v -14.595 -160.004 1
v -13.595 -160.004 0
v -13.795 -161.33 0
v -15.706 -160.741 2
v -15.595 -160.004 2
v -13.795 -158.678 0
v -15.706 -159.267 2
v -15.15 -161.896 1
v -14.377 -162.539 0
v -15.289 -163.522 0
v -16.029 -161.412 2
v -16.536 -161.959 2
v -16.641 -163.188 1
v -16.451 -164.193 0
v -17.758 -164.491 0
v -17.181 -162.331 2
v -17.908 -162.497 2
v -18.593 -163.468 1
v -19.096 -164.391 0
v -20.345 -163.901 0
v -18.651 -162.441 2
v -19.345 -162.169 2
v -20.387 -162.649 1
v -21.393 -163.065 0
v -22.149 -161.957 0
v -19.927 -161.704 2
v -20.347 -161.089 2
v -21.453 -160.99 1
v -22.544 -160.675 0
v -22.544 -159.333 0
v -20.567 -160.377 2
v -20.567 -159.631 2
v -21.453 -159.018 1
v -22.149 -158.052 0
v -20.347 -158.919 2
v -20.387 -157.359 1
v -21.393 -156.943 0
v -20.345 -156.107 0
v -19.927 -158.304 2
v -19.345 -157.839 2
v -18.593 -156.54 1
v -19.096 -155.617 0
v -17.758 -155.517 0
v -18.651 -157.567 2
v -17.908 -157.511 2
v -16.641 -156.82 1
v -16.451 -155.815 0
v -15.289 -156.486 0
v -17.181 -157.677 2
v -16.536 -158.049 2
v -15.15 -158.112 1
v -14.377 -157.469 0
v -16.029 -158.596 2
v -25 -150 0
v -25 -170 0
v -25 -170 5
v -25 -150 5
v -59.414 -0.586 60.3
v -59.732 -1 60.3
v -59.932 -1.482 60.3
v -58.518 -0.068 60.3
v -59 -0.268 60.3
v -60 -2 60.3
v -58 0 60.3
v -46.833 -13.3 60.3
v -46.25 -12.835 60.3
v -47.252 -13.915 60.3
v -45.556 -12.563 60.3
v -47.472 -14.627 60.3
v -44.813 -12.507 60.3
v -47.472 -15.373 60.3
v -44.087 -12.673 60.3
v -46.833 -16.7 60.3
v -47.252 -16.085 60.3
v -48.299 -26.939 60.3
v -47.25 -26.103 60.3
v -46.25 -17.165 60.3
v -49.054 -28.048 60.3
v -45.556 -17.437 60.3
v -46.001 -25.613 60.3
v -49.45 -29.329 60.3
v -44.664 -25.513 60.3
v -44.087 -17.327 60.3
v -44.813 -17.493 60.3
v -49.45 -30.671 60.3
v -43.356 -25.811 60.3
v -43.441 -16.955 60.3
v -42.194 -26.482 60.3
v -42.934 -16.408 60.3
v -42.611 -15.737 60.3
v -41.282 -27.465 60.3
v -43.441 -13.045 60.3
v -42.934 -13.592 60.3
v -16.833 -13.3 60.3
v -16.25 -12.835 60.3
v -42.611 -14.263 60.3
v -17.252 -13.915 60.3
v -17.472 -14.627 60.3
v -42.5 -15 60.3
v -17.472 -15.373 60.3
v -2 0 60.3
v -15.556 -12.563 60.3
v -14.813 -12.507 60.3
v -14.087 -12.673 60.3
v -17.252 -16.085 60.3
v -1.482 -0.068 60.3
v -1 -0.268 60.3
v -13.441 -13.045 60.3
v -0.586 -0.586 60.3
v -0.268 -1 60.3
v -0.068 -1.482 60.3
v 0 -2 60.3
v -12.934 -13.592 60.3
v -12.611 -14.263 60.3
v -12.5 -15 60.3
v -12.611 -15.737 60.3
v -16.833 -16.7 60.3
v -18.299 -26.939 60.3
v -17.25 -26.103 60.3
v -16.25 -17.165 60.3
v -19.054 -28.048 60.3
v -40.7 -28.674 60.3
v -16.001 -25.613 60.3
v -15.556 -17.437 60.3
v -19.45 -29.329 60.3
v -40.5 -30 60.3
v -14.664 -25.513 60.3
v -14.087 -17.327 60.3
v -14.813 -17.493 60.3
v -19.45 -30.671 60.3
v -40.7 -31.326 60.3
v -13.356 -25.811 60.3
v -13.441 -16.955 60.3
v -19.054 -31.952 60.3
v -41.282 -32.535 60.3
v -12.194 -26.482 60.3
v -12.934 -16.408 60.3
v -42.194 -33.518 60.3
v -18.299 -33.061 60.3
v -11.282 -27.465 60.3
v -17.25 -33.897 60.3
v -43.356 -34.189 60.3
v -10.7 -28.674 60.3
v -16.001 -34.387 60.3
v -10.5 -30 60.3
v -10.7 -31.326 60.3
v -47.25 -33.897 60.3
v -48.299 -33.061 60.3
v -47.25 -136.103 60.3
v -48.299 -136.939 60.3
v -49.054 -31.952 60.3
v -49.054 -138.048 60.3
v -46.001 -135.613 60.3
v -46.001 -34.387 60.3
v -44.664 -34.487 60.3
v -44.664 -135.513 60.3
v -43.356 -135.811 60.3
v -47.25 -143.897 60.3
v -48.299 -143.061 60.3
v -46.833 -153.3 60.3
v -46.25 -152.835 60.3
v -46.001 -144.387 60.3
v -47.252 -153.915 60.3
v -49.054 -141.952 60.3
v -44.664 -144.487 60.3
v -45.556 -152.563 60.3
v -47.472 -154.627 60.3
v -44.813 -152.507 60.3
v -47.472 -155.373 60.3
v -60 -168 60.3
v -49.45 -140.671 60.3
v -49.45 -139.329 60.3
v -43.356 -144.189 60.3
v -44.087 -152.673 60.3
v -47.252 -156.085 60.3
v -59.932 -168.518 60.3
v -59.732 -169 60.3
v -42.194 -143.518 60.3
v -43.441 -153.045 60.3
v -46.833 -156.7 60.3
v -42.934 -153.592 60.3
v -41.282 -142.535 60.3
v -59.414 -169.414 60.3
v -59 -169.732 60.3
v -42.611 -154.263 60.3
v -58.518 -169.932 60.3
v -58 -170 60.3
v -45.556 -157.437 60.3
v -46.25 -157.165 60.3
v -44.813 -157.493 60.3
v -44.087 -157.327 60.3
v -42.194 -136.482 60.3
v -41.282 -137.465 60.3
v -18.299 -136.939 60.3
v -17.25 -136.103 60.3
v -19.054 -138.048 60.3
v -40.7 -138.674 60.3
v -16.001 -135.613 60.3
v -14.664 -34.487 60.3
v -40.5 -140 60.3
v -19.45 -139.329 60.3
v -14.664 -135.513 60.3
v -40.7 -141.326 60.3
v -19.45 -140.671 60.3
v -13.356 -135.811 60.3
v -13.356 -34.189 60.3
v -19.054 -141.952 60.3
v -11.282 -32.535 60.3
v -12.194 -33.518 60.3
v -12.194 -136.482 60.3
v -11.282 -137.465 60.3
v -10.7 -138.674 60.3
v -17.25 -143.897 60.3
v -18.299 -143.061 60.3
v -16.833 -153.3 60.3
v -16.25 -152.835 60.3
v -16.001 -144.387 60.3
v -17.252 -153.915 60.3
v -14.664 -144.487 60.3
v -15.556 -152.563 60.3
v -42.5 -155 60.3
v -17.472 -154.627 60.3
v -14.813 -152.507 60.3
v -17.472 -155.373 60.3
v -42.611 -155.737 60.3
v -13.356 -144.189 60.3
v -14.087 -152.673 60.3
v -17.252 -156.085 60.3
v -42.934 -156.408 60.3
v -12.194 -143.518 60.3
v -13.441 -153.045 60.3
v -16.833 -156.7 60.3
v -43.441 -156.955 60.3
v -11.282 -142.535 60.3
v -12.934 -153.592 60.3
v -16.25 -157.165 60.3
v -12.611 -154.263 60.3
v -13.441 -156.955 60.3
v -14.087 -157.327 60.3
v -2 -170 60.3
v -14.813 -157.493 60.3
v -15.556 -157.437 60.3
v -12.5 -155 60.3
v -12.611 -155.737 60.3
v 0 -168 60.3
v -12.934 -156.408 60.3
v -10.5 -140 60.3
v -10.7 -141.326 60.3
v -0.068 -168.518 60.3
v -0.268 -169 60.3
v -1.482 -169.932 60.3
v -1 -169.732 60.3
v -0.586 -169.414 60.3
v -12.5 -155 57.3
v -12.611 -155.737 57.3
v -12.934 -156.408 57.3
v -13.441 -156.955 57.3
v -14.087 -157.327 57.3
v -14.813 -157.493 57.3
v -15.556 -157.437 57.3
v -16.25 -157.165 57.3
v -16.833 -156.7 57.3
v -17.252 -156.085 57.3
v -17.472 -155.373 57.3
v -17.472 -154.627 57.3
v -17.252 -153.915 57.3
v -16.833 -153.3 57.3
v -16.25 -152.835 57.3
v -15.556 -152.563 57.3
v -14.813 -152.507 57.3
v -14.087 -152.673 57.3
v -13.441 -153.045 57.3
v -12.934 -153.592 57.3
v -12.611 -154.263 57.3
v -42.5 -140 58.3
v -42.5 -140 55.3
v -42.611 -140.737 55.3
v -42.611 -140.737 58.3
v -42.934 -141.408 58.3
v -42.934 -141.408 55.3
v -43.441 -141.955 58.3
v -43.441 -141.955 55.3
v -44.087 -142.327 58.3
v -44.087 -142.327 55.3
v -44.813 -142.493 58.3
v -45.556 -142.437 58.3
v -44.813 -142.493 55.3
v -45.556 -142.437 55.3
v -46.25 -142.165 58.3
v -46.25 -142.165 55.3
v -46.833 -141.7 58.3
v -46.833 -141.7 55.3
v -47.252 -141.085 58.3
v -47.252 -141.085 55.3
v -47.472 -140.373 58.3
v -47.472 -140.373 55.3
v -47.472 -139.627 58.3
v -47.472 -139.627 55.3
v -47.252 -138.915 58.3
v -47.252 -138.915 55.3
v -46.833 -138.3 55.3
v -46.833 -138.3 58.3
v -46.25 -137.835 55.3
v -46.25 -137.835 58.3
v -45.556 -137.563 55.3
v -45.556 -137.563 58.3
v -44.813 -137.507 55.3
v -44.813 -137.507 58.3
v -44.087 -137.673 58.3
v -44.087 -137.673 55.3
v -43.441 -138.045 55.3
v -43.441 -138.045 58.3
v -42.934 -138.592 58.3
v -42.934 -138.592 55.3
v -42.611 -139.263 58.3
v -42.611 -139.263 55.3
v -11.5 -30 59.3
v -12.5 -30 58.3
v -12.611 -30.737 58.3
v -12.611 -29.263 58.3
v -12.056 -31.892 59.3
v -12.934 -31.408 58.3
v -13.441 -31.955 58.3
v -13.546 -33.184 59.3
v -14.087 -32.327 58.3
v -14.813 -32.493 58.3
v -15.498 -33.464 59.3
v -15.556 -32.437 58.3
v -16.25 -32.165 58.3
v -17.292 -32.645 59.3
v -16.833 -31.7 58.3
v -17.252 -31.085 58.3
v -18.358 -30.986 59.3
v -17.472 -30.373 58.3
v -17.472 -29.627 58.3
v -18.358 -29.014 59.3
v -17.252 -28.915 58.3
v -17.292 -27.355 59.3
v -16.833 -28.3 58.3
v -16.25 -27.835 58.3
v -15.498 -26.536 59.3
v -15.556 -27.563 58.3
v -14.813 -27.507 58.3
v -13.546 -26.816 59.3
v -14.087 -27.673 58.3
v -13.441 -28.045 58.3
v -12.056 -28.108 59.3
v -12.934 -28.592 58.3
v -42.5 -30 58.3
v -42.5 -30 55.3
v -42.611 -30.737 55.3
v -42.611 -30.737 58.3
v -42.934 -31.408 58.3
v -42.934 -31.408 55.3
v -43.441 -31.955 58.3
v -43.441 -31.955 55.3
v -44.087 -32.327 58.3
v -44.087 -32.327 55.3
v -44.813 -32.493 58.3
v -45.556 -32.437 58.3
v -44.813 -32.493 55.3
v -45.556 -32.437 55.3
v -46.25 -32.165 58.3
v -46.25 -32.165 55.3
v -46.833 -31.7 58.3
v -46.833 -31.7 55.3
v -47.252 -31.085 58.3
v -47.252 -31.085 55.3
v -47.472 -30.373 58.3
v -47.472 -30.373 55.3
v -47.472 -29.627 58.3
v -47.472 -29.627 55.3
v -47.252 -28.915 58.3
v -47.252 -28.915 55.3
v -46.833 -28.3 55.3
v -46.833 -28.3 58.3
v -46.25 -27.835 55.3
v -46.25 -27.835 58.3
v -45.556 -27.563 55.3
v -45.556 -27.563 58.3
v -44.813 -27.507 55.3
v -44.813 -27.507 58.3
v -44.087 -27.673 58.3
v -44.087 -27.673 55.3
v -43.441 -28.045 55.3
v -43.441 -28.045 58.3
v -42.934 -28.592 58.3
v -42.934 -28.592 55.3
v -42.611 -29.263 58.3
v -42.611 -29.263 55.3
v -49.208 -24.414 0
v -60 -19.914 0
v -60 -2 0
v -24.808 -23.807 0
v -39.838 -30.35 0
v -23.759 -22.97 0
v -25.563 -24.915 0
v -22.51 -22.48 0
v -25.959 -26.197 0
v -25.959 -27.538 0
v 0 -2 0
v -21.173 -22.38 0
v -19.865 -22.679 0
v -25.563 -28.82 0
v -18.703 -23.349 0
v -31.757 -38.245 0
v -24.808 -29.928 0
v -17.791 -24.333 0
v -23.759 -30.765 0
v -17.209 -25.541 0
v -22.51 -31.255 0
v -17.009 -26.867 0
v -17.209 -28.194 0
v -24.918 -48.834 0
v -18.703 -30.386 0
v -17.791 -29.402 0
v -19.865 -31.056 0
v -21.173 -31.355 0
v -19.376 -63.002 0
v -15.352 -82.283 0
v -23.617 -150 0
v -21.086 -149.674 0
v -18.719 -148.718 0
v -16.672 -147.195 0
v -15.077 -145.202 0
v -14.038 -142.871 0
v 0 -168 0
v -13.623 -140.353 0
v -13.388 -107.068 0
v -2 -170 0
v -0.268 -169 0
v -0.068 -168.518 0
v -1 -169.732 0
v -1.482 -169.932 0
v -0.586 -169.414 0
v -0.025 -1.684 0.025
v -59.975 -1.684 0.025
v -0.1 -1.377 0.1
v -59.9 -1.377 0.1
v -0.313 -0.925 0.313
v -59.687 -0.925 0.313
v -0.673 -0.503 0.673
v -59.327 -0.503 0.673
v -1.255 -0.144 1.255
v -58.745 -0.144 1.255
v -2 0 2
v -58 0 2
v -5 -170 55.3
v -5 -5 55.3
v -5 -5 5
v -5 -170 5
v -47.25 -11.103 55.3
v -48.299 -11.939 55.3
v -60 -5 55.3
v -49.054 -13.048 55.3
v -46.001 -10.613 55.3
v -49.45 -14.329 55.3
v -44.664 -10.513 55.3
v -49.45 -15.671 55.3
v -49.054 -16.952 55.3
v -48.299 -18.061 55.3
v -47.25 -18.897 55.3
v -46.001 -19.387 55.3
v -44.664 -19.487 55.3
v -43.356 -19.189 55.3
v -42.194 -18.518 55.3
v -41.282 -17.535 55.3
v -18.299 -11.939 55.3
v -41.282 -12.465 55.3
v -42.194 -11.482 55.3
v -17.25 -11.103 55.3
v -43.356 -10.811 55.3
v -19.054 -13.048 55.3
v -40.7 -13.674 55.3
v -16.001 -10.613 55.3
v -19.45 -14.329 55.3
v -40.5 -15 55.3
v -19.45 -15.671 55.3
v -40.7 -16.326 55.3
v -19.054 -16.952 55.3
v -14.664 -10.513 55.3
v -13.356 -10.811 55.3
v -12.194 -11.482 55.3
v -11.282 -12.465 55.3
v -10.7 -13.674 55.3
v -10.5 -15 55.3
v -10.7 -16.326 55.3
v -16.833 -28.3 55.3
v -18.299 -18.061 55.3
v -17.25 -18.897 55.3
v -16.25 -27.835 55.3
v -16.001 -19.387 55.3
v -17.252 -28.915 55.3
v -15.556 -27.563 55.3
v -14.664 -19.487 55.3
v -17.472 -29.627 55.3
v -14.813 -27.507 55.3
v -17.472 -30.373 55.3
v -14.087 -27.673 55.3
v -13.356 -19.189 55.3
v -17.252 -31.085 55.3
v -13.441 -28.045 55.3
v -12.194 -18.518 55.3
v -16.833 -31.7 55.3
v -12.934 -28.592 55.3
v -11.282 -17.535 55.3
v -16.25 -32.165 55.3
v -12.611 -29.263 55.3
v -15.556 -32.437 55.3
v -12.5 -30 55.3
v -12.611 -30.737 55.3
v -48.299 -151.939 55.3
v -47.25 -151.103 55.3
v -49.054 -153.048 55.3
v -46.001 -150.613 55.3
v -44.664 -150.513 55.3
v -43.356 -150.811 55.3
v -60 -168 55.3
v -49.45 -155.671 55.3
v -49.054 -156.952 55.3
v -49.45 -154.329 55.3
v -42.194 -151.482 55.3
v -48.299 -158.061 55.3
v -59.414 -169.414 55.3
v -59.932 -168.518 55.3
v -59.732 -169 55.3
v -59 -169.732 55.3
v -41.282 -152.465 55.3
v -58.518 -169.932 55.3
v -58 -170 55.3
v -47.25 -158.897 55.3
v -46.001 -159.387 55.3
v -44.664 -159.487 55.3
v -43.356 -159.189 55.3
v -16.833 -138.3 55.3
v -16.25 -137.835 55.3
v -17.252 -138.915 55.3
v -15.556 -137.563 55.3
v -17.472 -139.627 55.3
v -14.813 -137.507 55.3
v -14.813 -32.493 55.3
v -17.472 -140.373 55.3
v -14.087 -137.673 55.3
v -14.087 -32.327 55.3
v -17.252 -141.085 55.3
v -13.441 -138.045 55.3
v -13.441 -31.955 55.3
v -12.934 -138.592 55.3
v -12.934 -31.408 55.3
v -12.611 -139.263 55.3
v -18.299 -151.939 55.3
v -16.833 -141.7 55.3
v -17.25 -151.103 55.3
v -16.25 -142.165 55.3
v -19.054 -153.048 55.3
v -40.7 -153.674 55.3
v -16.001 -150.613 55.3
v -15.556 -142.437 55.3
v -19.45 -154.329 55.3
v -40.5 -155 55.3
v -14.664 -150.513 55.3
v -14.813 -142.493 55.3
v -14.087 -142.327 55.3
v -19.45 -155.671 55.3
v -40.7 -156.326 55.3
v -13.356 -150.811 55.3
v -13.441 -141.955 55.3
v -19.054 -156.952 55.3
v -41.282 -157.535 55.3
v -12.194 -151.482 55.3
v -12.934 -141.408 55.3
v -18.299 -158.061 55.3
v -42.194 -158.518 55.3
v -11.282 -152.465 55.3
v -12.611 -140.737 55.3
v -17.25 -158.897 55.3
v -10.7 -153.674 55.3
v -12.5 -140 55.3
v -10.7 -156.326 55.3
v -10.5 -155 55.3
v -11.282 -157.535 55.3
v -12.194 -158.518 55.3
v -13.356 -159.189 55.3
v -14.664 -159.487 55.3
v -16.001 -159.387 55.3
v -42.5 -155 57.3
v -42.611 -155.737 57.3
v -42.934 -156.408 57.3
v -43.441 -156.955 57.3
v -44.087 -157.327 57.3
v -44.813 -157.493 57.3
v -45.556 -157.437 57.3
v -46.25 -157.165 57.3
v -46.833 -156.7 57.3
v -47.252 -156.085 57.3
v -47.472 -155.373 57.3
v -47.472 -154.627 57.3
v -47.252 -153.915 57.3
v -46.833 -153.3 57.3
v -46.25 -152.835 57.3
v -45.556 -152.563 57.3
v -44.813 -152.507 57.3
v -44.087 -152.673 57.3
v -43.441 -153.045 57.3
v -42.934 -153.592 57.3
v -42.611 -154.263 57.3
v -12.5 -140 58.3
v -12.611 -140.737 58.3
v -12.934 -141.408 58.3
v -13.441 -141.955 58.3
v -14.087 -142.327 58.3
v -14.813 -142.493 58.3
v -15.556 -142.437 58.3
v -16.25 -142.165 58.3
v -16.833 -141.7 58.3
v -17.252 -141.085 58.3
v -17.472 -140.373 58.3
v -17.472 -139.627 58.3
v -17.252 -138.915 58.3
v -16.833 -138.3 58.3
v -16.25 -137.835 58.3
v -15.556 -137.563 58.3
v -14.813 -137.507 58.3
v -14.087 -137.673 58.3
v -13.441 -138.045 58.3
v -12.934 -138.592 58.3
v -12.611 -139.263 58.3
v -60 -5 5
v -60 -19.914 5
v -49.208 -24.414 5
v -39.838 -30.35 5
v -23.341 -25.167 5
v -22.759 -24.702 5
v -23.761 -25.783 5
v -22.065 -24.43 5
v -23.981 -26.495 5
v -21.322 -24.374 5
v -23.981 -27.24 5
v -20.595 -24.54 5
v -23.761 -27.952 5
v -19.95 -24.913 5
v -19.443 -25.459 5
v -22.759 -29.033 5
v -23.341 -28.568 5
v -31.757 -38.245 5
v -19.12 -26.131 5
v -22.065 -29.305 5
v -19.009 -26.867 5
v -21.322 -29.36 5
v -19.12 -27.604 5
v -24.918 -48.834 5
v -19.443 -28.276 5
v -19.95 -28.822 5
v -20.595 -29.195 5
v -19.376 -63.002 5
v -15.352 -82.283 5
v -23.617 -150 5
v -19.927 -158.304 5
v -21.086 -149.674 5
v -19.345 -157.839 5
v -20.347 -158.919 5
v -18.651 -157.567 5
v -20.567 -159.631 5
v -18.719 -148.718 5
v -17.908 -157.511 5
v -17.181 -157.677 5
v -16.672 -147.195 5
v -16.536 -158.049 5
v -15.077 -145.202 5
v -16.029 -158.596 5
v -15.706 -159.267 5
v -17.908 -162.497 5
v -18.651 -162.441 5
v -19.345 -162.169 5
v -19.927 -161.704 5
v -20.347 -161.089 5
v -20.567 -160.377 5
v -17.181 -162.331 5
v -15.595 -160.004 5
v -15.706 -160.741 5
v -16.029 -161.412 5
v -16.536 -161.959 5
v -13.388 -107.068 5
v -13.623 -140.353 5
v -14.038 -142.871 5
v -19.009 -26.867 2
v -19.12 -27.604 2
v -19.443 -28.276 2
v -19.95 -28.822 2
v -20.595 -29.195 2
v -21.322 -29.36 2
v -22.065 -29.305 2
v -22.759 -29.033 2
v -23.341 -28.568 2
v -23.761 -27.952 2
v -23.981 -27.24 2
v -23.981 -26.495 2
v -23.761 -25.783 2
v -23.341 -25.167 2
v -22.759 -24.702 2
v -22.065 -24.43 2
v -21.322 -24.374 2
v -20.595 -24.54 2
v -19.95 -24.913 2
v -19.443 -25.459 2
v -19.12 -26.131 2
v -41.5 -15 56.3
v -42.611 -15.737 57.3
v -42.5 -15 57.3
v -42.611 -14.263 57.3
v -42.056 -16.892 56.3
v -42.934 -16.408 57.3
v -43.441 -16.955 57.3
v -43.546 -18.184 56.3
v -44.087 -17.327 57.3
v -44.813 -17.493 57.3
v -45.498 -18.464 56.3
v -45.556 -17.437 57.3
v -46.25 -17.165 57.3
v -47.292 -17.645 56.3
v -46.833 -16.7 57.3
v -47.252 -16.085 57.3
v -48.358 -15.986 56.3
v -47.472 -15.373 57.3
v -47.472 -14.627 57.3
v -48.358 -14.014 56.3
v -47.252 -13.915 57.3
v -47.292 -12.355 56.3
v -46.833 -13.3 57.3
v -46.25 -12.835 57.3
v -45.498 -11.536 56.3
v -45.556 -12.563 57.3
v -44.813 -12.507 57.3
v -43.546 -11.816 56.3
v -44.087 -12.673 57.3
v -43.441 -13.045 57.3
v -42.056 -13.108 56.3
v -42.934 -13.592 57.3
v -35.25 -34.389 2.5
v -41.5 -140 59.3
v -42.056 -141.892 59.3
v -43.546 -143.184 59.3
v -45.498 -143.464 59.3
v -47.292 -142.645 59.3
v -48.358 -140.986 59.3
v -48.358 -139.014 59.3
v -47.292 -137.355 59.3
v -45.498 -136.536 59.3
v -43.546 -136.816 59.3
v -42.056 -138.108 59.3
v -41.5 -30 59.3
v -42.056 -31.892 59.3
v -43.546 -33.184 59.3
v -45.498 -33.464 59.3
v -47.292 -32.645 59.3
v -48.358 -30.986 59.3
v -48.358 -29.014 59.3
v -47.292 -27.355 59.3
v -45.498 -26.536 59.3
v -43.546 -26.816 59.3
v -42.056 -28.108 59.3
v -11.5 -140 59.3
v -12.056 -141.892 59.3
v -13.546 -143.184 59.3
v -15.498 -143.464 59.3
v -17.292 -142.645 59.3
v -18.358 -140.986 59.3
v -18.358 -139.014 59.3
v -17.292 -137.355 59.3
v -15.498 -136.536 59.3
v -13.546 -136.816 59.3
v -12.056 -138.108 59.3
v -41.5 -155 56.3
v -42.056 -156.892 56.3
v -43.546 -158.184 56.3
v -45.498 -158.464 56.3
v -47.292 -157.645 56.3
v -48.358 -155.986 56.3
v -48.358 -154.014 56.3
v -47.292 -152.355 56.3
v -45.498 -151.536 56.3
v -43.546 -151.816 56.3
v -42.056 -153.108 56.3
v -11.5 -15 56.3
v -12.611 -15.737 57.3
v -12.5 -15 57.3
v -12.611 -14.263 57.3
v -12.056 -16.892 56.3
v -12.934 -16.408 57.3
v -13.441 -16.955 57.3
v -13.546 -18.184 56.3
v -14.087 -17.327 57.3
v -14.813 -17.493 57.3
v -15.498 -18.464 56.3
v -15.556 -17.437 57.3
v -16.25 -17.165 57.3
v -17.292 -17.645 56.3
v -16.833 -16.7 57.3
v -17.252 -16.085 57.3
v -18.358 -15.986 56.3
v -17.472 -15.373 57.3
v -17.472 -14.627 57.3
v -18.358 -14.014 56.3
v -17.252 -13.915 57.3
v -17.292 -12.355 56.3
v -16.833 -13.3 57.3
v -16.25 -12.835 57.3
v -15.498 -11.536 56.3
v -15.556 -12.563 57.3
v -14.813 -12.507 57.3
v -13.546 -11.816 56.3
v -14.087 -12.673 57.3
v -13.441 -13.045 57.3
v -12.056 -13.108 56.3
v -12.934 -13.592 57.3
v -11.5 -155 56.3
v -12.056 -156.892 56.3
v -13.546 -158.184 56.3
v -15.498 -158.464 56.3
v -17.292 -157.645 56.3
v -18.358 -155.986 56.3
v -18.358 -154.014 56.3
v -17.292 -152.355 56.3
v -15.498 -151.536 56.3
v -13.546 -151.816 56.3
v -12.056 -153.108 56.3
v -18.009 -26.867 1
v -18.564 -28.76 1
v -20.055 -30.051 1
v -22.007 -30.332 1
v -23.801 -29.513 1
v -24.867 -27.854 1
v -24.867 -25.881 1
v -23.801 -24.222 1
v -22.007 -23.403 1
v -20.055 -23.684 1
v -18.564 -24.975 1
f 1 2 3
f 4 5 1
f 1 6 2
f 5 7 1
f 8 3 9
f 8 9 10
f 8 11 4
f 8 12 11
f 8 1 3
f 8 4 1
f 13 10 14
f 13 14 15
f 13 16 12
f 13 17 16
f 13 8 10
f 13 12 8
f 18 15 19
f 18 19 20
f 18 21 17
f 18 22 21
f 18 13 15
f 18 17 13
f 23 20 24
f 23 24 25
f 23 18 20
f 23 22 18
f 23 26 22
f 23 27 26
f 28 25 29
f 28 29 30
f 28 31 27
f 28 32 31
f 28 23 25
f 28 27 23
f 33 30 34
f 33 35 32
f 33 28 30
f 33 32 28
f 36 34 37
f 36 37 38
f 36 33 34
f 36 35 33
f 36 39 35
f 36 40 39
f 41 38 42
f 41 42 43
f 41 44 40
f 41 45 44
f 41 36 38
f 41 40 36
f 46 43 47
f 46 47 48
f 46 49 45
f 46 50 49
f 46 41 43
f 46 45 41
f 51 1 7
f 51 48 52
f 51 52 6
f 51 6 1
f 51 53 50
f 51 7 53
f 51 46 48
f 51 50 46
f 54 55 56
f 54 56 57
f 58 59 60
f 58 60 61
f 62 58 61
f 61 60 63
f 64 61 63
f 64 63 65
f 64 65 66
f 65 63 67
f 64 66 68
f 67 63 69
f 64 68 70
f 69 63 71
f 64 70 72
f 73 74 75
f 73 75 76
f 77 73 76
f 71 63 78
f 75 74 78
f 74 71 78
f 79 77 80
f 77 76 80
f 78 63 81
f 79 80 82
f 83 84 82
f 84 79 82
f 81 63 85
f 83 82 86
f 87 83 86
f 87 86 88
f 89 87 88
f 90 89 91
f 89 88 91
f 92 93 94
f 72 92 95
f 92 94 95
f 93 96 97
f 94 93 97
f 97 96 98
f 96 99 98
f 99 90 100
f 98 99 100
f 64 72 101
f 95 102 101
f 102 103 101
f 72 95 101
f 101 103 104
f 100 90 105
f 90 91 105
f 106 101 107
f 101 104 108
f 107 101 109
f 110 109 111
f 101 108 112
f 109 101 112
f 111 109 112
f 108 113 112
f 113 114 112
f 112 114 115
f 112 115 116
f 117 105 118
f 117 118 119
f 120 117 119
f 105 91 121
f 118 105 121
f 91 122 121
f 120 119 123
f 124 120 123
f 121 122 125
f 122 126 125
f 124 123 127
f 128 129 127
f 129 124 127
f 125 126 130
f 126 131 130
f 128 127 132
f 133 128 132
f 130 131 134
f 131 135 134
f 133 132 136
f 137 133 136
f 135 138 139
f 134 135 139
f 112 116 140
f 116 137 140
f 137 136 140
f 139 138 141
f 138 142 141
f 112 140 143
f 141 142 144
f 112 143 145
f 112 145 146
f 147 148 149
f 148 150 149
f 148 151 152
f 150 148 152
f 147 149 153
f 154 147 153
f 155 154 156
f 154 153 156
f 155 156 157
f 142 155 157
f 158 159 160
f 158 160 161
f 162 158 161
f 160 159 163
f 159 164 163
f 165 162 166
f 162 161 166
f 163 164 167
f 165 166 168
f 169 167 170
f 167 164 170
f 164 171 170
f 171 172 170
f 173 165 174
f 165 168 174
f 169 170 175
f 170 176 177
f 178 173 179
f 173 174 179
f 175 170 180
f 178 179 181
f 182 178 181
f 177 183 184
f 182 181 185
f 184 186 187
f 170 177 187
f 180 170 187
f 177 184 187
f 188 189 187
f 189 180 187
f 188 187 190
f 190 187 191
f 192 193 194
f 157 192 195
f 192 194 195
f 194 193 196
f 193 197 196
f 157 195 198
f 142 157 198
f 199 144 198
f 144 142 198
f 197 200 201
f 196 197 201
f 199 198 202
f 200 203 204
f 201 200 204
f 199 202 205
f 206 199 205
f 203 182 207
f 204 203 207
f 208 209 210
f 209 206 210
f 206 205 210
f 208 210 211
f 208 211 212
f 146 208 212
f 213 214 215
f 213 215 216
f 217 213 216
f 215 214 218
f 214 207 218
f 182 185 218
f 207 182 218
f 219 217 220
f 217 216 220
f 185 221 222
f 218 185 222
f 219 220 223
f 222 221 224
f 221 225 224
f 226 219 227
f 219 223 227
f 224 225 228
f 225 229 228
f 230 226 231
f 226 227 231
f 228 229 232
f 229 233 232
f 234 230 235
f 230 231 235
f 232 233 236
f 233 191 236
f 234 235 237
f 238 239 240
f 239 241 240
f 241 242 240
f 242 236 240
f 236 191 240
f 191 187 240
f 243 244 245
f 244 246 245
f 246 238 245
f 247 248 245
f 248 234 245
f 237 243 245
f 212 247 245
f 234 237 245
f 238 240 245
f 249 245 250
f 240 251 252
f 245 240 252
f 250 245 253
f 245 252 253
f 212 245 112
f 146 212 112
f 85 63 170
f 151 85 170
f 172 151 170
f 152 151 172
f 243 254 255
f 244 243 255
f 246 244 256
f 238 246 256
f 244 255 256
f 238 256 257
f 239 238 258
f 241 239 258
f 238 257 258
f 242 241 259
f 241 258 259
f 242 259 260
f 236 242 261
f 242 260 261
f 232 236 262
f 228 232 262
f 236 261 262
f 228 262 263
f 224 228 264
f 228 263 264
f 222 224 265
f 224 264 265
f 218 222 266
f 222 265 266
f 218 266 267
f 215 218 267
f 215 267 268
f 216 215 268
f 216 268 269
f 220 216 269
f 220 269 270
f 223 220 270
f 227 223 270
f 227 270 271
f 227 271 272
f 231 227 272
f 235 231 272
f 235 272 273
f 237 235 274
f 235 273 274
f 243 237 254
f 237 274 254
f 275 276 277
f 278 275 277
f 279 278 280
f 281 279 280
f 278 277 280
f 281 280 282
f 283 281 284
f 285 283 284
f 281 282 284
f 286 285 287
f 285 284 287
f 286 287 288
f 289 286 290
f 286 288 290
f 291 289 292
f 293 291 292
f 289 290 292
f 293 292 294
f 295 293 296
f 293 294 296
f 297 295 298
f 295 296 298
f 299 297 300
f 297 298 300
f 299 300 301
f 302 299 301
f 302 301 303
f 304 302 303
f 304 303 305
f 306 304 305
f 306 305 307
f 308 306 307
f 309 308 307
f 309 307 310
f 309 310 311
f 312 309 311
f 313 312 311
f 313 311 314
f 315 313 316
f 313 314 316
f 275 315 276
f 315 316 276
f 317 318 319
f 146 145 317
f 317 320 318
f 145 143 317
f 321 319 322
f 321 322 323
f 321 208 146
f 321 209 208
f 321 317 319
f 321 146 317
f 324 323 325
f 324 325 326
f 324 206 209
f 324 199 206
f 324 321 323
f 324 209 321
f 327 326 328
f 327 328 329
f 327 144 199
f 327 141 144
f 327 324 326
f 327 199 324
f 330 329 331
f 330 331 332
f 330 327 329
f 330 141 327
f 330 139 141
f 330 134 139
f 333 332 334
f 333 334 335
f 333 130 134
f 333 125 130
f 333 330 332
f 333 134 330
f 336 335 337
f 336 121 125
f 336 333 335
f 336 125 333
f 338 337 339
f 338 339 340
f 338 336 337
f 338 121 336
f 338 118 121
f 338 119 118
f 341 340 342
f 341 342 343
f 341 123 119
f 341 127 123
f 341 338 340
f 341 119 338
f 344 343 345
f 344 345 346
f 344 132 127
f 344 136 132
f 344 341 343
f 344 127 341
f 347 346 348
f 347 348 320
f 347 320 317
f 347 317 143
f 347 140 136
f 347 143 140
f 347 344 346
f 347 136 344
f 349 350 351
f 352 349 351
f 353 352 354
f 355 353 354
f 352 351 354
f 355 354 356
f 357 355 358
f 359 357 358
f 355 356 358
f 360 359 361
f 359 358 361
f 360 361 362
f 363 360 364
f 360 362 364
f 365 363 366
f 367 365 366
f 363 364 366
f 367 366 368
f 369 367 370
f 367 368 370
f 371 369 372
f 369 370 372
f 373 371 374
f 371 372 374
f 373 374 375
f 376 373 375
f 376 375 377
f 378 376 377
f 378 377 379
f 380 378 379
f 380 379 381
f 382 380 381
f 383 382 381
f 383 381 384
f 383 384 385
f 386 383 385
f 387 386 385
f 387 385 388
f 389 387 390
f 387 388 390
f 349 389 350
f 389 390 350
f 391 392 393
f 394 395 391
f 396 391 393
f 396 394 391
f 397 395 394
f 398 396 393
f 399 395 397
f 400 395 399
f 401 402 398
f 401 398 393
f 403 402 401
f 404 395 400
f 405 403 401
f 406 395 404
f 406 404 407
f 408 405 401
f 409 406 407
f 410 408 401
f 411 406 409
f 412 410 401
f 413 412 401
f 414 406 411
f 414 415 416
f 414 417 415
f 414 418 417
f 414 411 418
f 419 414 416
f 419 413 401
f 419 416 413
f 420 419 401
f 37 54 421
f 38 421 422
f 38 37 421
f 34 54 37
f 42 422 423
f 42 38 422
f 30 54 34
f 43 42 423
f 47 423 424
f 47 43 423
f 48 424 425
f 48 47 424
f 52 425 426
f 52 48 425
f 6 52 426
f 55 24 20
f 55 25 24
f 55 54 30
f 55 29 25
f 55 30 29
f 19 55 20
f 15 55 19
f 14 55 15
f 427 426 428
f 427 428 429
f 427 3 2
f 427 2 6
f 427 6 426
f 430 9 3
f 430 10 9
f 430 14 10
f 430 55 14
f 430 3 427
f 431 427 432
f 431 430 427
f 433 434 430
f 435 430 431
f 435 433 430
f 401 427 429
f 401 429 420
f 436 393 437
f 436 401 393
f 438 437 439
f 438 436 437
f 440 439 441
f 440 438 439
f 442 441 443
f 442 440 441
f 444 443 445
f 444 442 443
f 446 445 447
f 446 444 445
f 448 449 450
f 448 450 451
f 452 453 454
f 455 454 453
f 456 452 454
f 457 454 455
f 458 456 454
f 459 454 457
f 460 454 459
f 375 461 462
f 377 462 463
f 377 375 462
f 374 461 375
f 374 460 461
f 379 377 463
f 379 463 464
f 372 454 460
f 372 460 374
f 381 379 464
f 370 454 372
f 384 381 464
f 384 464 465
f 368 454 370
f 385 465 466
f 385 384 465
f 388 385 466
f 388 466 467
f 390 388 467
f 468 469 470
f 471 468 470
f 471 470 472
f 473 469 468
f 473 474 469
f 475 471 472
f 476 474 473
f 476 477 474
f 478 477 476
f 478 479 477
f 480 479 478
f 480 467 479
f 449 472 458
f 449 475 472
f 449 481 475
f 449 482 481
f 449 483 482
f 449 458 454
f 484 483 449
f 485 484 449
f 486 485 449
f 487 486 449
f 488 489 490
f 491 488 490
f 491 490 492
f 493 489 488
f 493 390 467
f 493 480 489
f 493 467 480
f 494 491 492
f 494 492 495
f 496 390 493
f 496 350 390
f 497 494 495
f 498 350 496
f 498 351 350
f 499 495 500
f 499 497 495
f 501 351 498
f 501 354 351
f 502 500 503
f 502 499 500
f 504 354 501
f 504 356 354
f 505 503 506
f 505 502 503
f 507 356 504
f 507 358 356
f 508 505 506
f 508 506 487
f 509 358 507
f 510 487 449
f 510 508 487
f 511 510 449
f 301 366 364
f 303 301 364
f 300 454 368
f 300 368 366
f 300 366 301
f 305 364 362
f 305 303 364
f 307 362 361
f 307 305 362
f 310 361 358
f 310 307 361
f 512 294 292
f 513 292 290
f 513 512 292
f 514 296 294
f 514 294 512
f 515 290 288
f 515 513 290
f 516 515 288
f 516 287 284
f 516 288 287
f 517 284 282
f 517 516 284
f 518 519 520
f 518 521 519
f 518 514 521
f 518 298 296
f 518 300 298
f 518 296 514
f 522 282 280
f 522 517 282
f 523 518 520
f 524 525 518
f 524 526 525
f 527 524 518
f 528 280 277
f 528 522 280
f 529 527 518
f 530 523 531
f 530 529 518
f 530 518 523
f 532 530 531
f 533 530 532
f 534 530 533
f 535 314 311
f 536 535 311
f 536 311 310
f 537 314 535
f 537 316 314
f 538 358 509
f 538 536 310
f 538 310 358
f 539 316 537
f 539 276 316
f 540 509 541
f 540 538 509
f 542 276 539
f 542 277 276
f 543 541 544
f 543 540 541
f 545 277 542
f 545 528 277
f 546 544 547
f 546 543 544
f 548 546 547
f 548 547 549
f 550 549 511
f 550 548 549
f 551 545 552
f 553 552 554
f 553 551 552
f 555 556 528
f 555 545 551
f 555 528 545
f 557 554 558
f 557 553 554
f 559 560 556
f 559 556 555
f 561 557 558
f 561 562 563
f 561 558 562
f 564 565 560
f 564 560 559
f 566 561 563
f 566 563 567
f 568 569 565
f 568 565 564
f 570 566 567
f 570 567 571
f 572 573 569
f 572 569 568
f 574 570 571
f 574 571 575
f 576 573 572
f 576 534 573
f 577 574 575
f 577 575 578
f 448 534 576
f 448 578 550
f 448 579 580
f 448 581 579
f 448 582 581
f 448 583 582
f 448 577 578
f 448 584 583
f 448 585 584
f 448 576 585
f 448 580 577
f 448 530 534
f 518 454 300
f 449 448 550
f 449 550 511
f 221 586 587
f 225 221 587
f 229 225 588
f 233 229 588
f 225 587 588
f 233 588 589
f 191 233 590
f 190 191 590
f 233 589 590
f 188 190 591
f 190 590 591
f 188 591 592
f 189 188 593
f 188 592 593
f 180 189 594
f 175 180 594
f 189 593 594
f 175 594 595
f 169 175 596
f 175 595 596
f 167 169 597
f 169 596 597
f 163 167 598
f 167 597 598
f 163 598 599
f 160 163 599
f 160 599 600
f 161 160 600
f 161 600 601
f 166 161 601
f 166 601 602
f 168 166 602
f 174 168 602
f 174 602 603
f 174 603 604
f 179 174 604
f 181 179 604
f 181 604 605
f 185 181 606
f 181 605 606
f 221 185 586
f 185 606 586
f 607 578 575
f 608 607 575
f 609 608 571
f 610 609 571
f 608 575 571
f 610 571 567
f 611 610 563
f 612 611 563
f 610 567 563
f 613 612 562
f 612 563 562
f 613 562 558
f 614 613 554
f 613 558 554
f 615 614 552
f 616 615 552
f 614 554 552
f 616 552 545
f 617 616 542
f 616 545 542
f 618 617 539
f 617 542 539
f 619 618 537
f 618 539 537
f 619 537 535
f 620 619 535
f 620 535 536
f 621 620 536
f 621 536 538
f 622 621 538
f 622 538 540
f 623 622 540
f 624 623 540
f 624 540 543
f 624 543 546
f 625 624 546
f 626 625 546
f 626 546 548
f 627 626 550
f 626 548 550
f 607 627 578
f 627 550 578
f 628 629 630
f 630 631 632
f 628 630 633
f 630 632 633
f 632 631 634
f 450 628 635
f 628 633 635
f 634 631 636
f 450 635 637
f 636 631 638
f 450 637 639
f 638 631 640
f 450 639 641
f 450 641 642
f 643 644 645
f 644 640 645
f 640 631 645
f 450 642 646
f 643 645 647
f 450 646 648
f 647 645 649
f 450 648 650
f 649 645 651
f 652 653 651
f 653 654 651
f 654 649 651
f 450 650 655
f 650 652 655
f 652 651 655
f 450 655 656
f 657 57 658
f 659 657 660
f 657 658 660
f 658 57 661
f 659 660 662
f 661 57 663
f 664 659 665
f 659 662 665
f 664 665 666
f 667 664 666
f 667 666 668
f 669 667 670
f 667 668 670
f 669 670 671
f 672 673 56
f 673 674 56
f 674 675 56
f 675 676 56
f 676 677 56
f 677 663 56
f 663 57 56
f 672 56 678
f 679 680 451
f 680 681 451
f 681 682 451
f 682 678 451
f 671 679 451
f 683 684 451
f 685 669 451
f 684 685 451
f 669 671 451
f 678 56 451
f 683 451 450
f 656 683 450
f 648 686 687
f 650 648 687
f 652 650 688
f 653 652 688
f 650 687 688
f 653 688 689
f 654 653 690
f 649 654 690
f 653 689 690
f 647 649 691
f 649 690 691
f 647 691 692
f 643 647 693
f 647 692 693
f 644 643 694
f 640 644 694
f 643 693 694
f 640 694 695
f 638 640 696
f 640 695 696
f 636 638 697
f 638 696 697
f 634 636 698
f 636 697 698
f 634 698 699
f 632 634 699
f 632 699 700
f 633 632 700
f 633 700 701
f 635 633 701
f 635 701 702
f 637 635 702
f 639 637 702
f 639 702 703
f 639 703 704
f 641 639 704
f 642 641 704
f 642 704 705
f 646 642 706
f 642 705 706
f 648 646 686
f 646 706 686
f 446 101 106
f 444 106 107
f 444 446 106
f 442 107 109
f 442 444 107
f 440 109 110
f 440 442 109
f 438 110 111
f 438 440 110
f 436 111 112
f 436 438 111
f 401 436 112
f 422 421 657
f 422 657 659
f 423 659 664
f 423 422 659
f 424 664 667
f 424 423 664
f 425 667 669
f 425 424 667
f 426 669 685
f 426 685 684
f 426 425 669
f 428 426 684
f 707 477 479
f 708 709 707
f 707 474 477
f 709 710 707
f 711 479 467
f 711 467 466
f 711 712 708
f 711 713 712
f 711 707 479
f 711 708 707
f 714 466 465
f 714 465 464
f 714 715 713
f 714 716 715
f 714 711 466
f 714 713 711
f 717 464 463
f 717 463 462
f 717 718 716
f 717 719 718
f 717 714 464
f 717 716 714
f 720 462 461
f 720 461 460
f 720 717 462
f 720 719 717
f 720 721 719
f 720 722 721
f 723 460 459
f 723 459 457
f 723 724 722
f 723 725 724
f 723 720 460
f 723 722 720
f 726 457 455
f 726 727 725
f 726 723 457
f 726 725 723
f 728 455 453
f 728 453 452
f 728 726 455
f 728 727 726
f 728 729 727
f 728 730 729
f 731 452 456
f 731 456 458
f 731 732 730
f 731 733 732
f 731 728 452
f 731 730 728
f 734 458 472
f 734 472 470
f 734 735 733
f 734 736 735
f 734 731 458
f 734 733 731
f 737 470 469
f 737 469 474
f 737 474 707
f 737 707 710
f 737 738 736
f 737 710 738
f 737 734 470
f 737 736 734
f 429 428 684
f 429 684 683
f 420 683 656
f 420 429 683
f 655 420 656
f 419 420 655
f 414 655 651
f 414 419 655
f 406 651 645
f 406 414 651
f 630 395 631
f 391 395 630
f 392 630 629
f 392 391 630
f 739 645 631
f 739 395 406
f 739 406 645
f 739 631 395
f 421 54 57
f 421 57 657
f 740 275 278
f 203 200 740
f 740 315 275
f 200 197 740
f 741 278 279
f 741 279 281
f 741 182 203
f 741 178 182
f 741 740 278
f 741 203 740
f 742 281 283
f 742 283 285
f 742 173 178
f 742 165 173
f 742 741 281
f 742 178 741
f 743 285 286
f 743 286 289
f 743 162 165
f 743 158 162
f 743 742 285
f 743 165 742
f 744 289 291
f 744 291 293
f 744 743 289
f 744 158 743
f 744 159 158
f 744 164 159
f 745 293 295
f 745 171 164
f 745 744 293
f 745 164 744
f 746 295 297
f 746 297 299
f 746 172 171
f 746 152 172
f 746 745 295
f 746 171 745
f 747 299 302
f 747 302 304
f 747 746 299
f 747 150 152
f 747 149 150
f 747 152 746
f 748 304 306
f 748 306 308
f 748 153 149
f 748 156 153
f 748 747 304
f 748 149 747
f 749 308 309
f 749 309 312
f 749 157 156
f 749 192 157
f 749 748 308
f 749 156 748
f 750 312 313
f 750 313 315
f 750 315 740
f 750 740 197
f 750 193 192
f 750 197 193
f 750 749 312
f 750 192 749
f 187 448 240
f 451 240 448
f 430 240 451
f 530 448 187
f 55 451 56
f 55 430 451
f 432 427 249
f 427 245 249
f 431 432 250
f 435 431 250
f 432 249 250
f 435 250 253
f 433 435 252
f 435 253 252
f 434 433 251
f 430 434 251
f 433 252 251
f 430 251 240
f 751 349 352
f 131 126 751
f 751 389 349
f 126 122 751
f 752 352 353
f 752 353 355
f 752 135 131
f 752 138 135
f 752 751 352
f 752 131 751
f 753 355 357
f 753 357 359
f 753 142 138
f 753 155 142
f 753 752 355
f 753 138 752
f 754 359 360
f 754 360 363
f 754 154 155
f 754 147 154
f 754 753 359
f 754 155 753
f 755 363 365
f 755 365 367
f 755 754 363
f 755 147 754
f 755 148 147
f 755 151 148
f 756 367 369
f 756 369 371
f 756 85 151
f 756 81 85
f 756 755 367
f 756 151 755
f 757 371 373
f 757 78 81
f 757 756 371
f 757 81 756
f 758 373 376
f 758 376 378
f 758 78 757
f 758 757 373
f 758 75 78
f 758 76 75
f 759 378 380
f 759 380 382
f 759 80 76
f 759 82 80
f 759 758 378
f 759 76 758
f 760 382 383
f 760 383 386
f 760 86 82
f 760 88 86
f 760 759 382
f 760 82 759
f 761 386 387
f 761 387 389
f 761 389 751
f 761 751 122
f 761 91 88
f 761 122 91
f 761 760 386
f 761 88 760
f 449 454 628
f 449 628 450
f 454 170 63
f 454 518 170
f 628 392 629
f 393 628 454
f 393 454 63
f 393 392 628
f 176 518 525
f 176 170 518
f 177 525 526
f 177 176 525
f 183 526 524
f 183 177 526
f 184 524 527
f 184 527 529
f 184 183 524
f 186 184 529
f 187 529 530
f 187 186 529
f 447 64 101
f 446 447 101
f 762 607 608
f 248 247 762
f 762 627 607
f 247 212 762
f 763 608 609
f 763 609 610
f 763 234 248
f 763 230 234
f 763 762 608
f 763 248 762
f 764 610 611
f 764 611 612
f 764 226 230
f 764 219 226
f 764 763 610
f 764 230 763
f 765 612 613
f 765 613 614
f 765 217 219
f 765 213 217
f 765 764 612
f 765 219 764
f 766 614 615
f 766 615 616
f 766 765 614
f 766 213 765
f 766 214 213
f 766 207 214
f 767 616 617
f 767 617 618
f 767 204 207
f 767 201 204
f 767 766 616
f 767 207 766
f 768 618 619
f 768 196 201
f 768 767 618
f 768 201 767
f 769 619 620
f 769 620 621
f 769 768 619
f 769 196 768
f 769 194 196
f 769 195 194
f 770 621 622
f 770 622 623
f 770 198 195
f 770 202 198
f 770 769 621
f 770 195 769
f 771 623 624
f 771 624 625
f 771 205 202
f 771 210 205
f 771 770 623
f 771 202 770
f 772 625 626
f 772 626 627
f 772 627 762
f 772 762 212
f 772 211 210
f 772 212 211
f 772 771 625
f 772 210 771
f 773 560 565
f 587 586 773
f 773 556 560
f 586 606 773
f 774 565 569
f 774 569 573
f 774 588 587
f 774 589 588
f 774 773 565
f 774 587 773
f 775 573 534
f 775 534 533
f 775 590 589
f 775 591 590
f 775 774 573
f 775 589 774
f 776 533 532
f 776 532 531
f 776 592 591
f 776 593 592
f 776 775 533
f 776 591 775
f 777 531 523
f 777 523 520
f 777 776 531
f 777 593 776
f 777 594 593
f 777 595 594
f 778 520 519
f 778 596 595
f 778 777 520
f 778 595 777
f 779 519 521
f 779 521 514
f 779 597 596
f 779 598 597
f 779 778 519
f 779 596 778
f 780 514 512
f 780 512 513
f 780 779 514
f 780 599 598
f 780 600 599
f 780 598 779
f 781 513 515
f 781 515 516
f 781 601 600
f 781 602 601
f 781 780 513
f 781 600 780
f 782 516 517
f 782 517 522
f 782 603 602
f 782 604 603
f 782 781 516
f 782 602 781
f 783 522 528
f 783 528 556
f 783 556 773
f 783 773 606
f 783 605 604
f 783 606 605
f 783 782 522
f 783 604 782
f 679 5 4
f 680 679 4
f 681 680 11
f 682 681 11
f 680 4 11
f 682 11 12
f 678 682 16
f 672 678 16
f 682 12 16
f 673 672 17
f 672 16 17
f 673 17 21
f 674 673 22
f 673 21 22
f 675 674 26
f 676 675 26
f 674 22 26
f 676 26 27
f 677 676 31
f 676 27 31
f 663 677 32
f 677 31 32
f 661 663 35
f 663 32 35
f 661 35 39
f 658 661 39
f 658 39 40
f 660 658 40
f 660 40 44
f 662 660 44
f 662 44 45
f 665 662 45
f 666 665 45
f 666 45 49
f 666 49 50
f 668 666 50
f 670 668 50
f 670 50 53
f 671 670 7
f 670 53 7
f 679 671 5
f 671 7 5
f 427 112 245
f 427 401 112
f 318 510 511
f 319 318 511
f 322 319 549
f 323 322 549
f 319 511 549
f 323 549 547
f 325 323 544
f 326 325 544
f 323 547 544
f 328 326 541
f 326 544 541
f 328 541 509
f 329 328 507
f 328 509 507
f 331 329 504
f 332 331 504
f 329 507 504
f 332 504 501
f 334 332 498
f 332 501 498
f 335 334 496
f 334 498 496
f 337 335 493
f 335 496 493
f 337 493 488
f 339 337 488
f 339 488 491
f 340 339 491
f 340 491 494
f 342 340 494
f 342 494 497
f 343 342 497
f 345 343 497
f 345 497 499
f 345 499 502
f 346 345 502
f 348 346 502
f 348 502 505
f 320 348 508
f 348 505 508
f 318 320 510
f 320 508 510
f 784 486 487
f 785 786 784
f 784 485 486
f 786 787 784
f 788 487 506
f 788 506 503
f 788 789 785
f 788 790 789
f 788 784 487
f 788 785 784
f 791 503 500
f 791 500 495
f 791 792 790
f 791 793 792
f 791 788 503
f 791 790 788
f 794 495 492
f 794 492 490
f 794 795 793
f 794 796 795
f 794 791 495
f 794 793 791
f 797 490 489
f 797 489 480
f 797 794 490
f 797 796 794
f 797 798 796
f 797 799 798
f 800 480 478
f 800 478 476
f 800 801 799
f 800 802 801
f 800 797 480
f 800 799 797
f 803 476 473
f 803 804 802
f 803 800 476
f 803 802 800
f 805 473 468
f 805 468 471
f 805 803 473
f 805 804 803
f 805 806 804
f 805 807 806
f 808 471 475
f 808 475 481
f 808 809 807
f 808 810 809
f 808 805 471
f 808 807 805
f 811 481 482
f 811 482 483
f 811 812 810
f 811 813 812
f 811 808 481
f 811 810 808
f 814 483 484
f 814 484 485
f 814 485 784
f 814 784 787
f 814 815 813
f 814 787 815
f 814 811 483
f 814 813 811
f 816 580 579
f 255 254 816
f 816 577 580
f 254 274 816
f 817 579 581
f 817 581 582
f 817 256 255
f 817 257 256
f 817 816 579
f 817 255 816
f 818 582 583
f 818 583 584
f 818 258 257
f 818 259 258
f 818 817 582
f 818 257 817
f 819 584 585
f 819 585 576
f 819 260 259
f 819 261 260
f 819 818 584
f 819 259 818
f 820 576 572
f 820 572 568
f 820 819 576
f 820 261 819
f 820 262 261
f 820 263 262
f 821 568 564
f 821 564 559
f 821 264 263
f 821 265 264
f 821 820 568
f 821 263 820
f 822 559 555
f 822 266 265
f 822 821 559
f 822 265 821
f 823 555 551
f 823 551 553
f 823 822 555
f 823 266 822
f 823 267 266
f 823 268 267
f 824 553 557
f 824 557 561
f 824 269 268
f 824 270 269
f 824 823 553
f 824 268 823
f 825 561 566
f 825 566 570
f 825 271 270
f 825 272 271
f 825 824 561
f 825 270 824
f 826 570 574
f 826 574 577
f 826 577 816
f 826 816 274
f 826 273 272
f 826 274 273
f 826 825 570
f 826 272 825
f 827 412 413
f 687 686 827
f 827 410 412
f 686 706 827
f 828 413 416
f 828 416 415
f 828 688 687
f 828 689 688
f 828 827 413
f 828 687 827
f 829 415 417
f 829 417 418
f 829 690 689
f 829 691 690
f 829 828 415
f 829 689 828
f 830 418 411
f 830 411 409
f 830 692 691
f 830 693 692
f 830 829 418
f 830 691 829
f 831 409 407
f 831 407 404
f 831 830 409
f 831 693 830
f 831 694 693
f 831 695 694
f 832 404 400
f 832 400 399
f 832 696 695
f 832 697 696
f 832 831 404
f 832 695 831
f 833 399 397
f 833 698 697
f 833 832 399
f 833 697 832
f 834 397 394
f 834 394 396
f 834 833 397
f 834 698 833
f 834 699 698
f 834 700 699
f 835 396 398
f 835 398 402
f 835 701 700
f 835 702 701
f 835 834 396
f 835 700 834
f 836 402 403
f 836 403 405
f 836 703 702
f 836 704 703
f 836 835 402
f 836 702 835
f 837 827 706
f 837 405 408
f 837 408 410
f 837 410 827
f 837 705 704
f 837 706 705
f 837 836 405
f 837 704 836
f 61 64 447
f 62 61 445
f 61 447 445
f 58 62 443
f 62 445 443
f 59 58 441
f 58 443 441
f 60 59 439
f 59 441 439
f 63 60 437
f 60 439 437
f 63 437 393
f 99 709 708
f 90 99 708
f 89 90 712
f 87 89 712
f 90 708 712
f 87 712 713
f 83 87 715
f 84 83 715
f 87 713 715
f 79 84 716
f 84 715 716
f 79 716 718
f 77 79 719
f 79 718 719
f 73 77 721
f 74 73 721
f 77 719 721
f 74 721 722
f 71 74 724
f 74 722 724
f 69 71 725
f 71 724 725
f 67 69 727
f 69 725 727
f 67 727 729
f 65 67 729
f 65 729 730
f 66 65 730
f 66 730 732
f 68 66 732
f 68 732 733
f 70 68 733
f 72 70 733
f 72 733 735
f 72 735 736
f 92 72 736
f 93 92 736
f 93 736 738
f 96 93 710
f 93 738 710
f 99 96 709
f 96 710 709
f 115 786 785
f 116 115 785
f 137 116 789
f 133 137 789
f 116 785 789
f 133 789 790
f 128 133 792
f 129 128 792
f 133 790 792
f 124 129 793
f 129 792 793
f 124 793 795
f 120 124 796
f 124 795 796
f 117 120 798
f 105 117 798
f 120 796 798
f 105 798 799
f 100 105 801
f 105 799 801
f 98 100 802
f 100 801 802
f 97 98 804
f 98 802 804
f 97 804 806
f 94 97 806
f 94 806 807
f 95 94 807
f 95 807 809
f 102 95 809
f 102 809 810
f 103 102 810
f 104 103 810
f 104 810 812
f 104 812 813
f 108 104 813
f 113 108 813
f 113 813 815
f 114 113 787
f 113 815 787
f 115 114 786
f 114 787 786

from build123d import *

# Parameters (mm, degrees)
F0_R     = 2.5
F1_DEPTH = 5
F2_W     = 170
F2_H     = 50.3
F3_DEPTH = 5
F4_W     = 55
F4_H     = 50.3
F5_DEPTH = 5
F7_R     = 2.5
F8_DEPTH = 5
F9_SIZE  = 2
F10_SIZE = 2
F11_SIZE = 2
F12_R    = 2


# Not quite as in the source:
# - a feature names something its author has since deleted; it is built from what else it names


with BuildPart() as f1:
    # F0 (on Top) → F1 (new body)
    with BuildSketch(Plane.XY):
        with BuildLine():
            Line((-60, 0), (0, 0))
            Line((0, 0), (0, 150))
            Line((0, 150), (0, 170))
            Line((0, 170), (-15, 170))
            add(Edge.make_bspline(
                [(-15, 170), (-14.4841735922, 160.0600889734), (-13.9683471845, 150.1201779469), (-13.6234299021, 140.3529161241)],
                knots=[0, 0, 0, 0, 0.0906883322, 0.0906883322, 0.0906883322, 0.0906883322], degree=3))
            add(Edge.make_bspline(
                [(-13.6234299021, 140.3529161241), (-12.0632834056, 96.1731661082), (-14.5980537911, 42.9711861088), (-50.2193379026, 23.1925838291), (-60, 19.9139873857)],
                knots=[0.0906883322, 0.0906883322, 0.0906883322, 0.0906883322, 0.5008941728, 0.6275927921, 0.6275927921, 0.6275927921, 0.6275927921], degree=3))
            Line((-60, 19.9139873857), (-60, 0))
        make_face()
        with Locations((-21.5087961406, 26.8674660474)):
            Circle(F0_R, mode=Mode.SUBTRACT)
        with BuildLine():
            ThreePointArc((-23.6172004723, 150), (-16.6720280929, 147.1947606368), (-13.6234299021, 140.3529161241))
            add(Edge.make_bspline(
                [(-15, 170), (-14.4841735922, 160.0600889734), (-13.9683471845, 150.1201779469), (-13.6234299021, 140.3529161241)],
                knots=[0, 0, 0, 0, 0.0906883322, 0.0906883322, 0.0906883322, 0.0906883322], degree=3))
            Line((-15, 170), (-25, 170))
            Line((-25, 170), (-25, 150))
            Line((-25, 150), (-23.6172004723, 150))
        make_face()
        with Locations((-18.0946737528, 160.0040644407)):
            Circle(F0_R, mode=Mode.SUBTRACT)
    extrude(amount=F1_DEPTH)

    # F2 (on face) → F3 (join)
    with BuildSketch(Plane.YZ):
        with Locations((85, 30.15)):
            Rectangle(F2_W, F2_H)
    extrude(amount=-F3_DEPTH)

    # F4 (on face) → F5 (join)
    with BuildSketch(Plane.XZ):
        with Locations((-32.5, 30.15)):
            Rectangle(F4_W, F4_H)
    extrude(amount=-F5_DEPTH)

    # F7 (on face) → F8 (join)
    with BuildSketch(Plane.XY.offset(55.3)):
        Polygon((-15, 0), (0, 0), (0, 15), (0, 155), (0, 170), (-15, 170), (-45, 170), (-60, 170), (-60, 155), (-60, 15), (-60, 0), (-45, 0), align=None)
        with Locations((-45, 15)):
            Circle(F7_R, mode=Mode.SUBTRACT)
        with Locations((-45, 30)):
            Circle(F7_R, mode=Mode.SUBTRACT)
        with Locations((-15, 15)):
            Circle(F7_R, mode=Mode.SUBTRACT)
        with Locations((-15, 30)):
            Circle(F7_R, mode=Mode.SUBTRACT)
        with Locations((-45, 140)):
            Circle(F7_R, mode=Mode.SUBTRACT)
        with Locations((-45, 155)):
            Circle(F7_R, mode=Mode.SUBTRACT)
        with Locations((-15, 140)):
            Circle(F7_R, mode=Mode.SUBTRACT)
        with Locations((-15, 155)):
            Circle(F7_R, mode=Mode.SUBTRACT)
    extrude(amount=F8_DEPTH)

    # F9
    f9_edges = [f1.edges().sort_by_distance(p)[0] for p in [
        (-17.5, 140, 60.3),
        (-47.5, 140, 60.3),
        (-17.5, 30, 60.3),
        (-47.5, 30, 60.3),
    ]]
    chamfer(f9_edges, length=F9_SIZE)

    # F10
    f10_edges = [f1.edges().sort_by_distance(p)[0] for p in [
        (-47.5, 155, 55.3),
        (-17.5, 155, 55.3),
        (-47.5, 15, 55.3),
        (-17.5, 15, 55.3),
    ]]
    chamfer(f10_edges, length=F10_SIZE)

    # F11
    f11_edges = [f1.edges().sort_by_distance(p)[0] for p in [
        (-24.008796, 26.867466, 0),
        (-20.594674, 160.004064, 0),
    ]]
    chamfer(f11_edges, length=F11_SIZE)

    # F12
    f12_edges = [f1.edges().sort_by_distance(p)[0] for p in [
        (0, 0, 30.15),
        (-60, 0, 30.15),
        (-30, 0, 0),
        (0, 170, 30.15),
        (-60, 170, 57.8),
    ]]
    fillet(f12_edges, radius=F12_R)


with BuildPart() as f13_1:
    # F13: instance of F1
    add(f1.part.mirror(Plane(origin=(-30, 0, 31.15), x_dir=(1, 0, 0), z_dir=(0, -1, 0))))


solid = f13_1.part
